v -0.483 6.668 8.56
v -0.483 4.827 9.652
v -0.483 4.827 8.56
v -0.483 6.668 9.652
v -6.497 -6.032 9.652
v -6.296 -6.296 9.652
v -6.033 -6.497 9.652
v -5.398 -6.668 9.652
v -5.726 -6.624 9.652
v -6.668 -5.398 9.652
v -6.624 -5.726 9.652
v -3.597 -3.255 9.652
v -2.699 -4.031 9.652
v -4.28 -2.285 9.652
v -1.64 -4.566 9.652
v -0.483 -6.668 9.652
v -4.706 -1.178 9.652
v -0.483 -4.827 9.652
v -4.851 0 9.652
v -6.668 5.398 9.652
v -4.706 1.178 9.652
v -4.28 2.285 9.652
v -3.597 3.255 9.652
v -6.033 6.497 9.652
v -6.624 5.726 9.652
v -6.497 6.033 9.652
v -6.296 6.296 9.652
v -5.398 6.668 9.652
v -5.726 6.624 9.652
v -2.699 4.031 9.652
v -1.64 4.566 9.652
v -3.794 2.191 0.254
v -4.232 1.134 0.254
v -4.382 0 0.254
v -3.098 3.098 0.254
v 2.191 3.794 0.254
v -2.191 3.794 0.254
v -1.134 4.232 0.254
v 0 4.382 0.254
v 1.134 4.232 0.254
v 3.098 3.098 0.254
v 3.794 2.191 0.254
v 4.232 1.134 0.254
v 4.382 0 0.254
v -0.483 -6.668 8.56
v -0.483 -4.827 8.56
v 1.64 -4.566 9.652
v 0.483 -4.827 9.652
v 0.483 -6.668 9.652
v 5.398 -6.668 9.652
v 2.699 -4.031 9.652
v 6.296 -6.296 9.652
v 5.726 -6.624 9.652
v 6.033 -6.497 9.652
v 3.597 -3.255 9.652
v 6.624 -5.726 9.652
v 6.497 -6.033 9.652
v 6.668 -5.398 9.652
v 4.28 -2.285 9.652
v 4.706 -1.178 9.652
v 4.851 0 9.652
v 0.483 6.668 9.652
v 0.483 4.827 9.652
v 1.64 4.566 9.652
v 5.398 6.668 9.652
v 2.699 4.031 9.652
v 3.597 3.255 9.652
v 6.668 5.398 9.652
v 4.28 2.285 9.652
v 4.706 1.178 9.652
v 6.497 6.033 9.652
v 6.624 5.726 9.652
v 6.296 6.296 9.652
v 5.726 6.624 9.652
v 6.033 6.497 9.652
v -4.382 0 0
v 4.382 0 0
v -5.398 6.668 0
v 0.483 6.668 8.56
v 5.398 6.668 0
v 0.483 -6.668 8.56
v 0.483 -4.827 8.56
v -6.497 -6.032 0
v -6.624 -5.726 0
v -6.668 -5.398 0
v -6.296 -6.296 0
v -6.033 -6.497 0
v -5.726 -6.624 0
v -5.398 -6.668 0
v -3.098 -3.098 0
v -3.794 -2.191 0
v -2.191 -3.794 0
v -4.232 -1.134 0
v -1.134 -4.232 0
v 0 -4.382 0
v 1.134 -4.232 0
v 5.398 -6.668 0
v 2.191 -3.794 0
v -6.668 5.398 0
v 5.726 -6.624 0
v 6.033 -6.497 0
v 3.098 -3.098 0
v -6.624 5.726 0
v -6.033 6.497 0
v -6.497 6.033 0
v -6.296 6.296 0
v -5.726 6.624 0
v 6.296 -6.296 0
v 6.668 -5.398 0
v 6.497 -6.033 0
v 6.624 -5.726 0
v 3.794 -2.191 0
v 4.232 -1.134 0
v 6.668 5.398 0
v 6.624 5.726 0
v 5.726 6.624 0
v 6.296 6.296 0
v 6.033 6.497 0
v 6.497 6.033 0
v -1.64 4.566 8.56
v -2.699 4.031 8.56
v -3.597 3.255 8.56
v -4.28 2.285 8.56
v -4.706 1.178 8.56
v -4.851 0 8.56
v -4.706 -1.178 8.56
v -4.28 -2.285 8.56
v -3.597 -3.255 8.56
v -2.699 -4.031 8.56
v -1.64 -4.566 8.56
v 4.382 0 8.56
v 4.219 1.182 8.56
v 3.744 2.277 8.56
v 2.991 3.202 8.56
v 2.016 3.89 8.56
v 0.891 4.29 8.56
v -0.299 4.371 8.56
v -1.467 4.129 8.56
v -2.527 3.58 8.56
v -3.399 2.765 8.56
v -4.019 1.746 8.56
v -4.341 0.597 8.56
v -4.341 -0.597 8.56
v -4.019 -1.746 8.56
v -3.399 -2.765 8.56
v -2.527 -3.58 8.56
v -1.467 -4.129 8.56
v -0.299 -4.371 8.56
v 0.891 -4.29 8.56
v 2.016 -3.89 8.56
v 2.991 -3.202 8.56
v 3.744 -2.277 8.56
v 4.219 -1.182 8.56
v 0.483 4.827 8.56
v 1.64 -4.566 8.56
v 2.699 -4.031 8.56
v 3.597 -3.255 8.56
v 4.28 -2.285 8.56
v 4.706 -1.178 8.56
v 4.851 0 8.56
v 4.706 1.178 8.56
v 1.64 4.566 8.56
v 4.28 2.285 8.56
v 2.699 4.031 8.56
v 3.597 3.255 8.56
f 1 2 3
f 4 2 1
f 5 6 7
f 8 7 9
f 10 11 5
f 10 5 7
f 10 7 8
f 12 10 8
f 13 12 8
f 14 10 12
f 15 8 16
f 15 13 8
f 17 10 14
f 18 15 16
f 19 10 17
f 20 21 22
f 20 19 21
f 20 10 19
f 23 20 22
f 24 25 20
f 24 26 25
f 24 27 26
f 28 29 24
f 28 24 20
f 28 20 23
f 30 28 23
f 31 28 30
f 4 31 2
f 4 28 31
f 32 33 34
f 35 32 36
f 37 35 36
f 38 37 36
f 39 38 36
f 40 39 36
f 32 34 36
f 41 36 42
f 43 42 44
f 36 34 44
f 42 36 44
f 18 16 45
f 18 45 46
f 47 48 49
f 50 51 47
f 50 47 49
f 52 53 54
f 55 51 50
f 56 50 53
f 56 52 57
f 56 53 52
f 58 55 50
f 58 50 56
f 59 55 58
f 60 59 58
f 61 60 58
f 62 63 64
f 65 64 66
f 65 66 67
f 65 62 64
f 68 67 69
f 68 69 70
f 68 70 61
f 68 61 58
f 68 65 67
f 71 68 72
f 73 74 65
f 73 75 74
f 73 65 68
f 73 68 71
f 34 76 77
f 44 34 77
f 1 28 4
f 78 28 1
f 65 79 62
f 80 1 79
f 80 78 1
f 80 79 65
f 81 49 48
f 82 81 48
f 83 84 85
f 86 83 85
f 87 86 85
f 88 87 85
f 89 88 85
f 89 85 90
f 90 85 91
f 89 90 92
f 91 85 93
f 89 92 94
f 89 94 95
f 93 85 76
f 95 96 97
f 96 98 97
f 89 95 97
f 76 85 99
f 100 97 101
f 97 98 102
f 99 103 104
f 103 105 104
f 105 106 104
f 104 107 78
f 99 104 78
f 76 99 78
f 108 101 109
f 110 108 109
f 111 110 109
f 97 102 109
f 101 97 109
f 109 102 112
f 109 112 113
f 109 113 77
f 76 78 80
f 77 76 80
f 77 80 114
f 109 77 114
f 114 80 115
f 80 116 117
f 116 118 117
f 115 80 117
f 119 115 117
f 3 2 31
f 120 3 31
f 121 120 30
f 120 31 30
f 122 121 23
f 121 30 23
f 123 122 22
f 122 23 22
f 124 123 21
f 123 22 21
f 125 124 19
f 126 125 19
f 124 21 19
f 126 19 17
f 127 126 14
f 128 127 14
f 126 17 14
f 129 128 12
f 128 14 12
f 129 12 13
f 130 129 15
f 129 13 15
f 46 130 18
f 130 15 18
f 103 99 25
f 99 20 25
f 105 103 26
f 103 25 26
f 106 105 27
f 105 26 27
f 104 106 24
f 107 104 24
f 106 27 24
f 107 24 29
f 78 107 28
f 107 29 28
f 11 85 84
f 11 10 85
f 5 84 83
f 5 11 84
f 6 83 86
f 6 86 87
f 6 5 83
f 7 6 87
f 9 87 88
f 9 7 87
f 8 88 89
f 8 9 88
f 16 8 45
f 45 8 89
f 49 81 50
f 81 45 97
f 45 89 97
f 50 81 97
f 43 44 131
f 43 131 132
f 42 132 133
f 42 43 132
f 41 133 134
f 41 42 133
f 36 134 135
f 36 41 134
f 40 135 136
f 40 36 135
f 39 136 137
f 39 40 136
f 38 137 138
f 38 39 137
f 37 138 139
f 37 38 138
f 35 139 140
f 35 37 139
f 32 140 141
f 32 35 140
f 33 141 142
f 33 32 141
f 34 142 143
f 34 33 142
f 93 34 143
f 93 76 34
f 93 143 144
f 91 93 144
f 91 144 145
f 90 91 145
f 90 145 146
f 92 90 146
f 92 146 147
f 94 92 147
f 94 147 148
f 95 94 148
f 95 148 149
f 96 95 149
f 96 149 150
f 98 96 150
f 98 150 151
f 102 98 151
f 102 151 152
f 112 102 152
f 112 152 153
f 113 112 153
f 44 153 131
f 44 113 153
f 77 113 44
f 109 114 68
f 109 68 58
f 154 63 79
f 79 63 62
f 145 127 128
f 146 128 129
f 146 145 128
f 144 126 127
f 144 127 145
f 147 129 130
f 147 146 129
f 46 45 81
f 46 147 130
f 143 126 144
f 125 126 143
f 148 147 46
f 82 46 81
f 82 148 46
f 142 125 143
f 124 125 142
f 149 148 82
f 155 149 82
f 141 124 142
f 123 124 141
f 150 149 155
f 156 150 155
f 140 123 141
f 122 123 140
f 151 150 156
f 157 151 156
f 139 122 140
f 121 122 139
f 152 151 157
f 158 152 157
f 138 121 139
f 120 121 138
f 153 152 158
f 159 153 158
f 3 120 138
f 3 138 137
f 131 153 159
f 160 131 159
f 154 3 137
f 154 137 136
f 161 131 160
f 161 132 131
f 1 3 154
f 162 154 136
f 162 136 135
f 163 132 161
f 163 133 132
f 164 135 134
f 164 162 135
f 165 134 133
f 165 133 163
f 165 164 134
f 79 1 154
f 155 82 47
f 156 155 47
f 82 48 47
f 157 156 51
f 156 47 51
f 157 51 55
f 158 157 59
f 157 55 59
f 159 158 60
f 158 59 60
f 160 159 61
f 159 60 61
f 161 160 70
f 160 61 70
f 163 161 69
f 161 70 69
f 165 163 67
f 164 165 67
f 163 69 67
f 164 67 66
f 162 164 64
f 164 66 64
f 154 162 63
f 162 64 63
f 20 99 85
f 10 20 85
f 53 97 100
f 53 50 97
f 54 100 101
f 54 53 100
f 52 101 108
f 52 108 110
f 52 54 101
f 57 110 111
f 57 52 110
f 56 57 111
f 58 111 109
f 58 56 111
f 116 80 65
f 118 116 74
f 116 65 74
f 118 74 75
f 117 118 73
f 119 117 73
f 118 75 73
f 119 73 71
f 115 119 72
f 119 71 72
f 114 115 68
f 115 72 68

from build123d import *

# Parameters (mm, degrees)
F0_W     = 13.335
F0_H     = 13.335
F0_R     = 4.3815
F1_DEPTH = 9.652
F2_W     = 0.9652
F2_H     = 13.335
F3_DEPTH = 1.0922
F4_R     = 1.27
F5_R     = 4.8514
F6_DEPTH = 1.0922
F7_W     = 13.335
F7_H     = 4.872686
F8_DEPTH = 0.254


with BuildPart() as f1:
    # F0 (on Top) → F1 (new body)
    with BuildSketch(Plane.XY):
        Rectangle(F0_W, F0_H)
        Circle(F0_R, mode=Mode.SUBTRACT)
    extrude(amount=F1_DEPTH)

    # F2 (on face) → F3 (cut)
    with BuildSketch(Plane.XY.offset(9.652)):
        Rectangle(F2_W, F2_H)
    extrude(amount=-F3_DEPTH, mode=Mode.SUBTRACT)

    # F4
    f4_edges = [f1.edges().sort_by_distance(p)[0] for p in [
        (-6.6675, -6.6675, 4.826),
        (6.6675, -6.6675, 4.826),
        (6.6675, 6.6675, 4.826),
        (-6.6675, 6.6675, 4.826),
    ]]
    fillet(f4_edges, radius=F4_R)

    # F5 (on face) → F6 (cut)
    with BuildSketch(Plane.XY.offset(9.652)):
        Circle(F5_R)
    extrude(amount=-F6_DEPTH, mode=Mode.SUBTRACT)

    # F7 (on face) → F8 (join)
    with BuildSketch(Plane(origin=(0, 0, 0), x_dir=(1, 0, 0), z_dir=(0, 0, -1))):
        with Locations((0, -2.436343)):
            Rectangle(F7_W, F7_H)
    extrude(amount=-F8_DEPTH)


solid = f1.part
